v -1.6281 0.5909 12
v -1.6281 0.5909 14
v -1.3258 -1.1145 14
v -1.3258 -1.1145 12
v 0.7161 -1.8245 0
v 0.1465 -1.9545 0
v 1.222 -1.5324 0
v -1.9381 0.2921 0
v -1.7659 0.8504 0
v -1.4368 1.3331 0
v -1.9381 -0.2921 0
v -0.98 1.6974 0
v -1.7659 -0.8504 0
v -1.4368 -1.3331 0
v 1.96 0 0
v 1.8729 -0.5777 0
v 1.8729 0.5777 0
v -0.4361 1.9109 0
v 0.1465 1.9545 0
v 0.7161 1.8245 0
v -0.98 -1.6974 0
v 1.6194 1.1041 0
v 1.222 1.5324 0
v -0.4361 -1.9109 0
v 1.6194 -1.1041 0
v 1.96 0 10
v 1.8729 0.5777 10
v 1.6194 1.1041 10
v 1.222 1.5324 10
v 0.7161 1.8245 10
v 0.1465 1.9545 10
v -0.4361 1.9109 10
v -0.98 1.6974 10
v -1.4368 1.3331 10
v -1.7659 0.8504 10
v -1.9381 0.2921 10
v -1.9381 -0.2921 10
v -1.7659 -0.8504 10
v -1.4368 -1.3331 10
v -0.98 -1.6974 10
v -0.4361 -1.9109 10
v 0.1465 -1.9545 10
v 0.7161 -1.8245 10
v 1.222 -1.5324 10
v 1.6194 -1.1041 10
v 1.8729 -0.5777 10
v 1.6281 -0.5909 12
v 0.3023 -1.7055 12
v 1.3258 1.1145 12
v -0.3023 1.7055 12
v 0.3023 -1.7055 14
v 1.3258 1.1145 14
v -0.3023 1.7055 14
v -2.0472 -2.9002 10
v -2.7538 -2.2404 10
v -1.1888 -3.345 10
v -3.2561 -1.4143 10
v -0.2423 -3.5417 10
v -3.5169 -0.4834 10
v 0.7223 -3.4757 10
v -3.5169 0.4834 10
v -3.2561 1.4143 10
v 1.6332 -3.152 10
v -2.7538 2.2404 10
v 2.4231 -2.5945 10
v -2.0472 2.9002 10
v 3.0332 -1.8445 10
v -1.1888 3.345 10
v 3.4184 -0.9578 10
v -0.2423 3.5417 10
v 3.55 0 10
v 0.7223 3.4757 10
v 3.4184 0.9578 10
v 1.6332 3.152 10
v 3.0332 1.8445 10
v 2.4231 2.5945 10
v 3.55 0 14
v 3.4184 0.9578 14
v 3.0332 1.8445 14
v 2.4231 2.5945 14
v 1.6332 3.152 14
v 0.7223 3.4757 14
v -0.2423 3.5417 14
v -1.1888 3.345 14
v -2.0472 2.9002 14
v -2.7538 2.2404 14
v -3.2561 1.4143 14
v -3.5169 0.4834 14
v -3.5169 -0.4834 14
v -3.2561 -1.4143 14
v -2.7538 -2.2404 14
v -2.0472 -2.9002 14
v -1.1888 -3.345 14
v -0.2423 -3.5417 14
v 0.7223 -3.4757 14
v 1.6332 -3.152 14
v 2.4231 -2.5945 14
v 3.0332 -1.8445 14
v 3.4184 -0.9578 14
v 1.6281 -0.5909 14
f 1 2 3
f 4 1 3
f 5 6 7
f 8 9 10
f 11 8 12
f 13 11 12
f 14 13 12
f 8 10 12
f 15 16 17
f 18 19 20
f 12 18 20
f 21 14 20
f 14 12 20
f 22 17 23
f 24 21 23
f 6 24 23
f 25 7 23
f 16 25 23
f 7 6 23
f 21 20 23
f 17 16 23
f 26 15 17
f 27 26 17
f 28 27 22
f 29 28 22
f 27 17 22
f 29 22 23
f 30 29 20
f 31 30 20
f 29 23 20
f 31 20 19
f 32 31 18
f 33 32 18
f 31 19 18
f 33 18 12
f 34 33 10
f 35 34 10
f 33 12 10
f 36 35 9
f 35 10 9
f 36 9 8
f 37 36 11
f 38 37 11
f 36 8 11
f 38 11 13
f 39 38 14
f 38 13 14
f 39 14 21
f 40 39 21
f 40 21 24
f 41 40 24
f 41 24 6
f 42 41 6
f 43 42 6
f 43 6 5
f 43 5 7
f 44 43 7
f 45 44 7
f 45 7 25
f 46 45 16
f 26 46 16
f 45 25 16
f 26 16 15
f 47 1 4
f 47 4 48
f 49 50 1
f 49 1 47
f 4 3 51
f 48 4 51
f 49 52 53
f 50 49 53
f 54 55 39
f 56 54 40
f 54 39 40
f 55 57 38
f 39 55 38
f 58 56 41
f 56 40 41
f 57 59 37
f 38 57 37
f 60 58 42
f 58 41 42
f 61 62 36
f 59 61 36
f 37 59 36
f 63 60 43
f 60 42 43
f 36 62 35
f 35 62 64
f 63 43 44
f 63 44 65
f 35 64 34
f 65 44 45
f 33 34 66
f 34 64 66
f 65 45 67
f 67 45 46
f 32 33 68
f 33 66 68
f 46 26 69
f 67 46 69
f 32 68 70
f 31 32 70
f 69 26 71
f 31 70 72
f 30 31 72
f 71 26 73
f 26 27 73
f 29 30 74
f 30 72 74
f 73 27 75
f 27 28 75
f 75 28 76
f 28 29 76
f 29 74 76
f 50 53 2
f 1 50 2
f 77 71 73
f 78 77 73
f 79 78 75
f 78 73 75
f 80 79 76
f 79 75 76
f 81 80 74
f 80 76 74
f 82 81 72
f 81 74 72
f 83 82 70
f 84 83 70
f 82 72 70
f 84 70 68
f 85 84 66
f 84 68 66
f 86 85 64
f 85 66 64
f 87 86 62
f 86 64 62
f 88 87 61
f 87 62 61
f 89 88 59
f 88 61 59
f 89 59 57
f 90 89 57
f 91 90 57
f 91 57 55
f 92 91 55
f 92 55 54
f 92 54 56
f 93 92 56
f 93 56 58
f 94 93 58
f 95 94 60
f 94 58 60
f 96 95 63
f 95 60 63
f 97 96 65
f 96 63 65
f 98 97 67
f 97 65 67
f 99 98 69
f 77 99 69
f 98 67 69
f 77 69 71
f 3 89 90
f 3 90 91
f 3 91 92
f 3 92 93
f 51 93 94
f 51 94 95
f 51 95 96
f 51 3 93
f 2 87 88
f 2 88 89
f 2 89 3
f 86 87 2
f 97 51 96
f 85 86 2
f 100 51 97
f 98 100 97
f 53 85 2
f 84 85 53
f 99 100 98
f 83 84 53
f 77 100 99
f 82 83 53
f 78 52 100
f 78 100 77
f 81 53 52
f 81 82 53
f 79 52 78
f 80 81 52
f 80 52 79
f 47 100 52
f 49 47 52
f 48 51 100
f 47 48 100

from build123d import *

# Parameters (mm, degrees)
SKETCH1_R           = 1.96
BOSS_EXTRUDE1_DEPTH = 10
SKETCH2_R           = 3.55
BOSS_EXTRUDE2_DEPTH = 4
CUT_EXTRUDE1_DEPTH  = 2


with BuildPart() as part:
    # Sketch1 → Boss-Extrude1 (new body)
    with BuildSketch(Plane.XY):
        Circle(SKETCH1_R)
    extrude(amount=BOSS_EXTRUDE1_DEPTH)

    # Sketch2 → Boss-Extrude2 (add)
    with BuildSketch(Plane.XY.offset(10)):
        Circle(SKETCH2_R)
    extrude(amount=BOSS_EXTRUDE2_DEPTH)

    # Sketch3 → Cut-Extrude1 (cut)
    with BuildSketch(Plane.XY.offset(14)):
        Polygon((1.325823406, 1.114536808), (-0.302305486, 1.705465155), (-1.628128892, 0.590928347), (-1.325823406, -1.114536808), (0.302305486, -1.705465155), (1.628128892, -0.590928347), align=None)
    extrude(amount=-CUT_EXTRUDE1_DEPTH, mode=Mode.SUBTRACT)


solid = part.part
